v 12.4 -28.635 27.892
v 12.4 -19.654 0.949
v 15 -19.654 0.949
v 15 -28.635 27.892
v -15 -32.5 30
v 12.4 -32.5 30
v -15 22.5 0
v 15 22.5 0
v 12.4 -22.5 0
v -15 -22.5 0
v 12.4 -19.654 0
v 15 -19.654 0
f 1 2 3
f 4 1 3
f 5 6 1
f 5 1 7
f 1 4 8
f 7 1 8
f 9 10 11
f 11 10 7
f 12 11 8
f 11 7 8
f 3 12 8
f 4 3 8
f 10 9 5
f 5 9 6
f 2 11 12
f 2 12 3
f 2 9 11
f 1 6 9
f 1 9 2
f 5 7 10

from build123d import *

# Parameters (mm, degrees)
F0_W     = 30
F0_H     = 45
F0_H_2   = 10
F1_DEPTH = 30
F3_DEPTH = 30.001
F4_W     = 2.6
F4_H     = 31.6227766017
F5_DEPTH = 3
F7_DEPTH = 2.6


with BuildPart() as f1:
    # F0 (on Top) → F1 (new body)
    with BuildSketch(Plane.XY):
        Rectangle(F0_W, F0_H)
        with Locations((0, -27.5)):
            Rectangle(F0_W, F0_H_2)
    extrude(amount=F1_DEPTH)

    # F2 (on face) → F3 (cut, through all)
    with BuildSketch(Plane.YZ.offset(15)):
        Polygon((-32.5, 0), (-22.5, 0), (-32.5, 30), align=None)
        Polygon((22.5, 30), (-32.5, 30), (22.5, 0), align=None)
    extrude(amount=-F3_DEPTH, mode=Mode.SUBTRACT)

    # F4 (on face) → F5 (cut)
    with BuildSketch(Plane(origin=(0, -20.25, -6.75), x_dir=(1, 0, 0), z_dir=(0, -0.9486832981, -0.316227766))):
        with Locations((13.7, 22.9265130362)):
            Rectangle(F4_W, F4_H)
    extrude(amount=-F5_DEPTH, mode=Mode.SUBTRACT)

    # F6 (on face) → F7 (cut)
    with BuildSketch(Plane.YZ.offset(15)):
        Polygon((-19.6539501058, 0), (-19.6539501058, 0.9486832981), (-22.5, 0), align=None)
    extrude(amount=-F7_DEPTH, mode=Mode.SUBTRACT)


solid = f1.part
